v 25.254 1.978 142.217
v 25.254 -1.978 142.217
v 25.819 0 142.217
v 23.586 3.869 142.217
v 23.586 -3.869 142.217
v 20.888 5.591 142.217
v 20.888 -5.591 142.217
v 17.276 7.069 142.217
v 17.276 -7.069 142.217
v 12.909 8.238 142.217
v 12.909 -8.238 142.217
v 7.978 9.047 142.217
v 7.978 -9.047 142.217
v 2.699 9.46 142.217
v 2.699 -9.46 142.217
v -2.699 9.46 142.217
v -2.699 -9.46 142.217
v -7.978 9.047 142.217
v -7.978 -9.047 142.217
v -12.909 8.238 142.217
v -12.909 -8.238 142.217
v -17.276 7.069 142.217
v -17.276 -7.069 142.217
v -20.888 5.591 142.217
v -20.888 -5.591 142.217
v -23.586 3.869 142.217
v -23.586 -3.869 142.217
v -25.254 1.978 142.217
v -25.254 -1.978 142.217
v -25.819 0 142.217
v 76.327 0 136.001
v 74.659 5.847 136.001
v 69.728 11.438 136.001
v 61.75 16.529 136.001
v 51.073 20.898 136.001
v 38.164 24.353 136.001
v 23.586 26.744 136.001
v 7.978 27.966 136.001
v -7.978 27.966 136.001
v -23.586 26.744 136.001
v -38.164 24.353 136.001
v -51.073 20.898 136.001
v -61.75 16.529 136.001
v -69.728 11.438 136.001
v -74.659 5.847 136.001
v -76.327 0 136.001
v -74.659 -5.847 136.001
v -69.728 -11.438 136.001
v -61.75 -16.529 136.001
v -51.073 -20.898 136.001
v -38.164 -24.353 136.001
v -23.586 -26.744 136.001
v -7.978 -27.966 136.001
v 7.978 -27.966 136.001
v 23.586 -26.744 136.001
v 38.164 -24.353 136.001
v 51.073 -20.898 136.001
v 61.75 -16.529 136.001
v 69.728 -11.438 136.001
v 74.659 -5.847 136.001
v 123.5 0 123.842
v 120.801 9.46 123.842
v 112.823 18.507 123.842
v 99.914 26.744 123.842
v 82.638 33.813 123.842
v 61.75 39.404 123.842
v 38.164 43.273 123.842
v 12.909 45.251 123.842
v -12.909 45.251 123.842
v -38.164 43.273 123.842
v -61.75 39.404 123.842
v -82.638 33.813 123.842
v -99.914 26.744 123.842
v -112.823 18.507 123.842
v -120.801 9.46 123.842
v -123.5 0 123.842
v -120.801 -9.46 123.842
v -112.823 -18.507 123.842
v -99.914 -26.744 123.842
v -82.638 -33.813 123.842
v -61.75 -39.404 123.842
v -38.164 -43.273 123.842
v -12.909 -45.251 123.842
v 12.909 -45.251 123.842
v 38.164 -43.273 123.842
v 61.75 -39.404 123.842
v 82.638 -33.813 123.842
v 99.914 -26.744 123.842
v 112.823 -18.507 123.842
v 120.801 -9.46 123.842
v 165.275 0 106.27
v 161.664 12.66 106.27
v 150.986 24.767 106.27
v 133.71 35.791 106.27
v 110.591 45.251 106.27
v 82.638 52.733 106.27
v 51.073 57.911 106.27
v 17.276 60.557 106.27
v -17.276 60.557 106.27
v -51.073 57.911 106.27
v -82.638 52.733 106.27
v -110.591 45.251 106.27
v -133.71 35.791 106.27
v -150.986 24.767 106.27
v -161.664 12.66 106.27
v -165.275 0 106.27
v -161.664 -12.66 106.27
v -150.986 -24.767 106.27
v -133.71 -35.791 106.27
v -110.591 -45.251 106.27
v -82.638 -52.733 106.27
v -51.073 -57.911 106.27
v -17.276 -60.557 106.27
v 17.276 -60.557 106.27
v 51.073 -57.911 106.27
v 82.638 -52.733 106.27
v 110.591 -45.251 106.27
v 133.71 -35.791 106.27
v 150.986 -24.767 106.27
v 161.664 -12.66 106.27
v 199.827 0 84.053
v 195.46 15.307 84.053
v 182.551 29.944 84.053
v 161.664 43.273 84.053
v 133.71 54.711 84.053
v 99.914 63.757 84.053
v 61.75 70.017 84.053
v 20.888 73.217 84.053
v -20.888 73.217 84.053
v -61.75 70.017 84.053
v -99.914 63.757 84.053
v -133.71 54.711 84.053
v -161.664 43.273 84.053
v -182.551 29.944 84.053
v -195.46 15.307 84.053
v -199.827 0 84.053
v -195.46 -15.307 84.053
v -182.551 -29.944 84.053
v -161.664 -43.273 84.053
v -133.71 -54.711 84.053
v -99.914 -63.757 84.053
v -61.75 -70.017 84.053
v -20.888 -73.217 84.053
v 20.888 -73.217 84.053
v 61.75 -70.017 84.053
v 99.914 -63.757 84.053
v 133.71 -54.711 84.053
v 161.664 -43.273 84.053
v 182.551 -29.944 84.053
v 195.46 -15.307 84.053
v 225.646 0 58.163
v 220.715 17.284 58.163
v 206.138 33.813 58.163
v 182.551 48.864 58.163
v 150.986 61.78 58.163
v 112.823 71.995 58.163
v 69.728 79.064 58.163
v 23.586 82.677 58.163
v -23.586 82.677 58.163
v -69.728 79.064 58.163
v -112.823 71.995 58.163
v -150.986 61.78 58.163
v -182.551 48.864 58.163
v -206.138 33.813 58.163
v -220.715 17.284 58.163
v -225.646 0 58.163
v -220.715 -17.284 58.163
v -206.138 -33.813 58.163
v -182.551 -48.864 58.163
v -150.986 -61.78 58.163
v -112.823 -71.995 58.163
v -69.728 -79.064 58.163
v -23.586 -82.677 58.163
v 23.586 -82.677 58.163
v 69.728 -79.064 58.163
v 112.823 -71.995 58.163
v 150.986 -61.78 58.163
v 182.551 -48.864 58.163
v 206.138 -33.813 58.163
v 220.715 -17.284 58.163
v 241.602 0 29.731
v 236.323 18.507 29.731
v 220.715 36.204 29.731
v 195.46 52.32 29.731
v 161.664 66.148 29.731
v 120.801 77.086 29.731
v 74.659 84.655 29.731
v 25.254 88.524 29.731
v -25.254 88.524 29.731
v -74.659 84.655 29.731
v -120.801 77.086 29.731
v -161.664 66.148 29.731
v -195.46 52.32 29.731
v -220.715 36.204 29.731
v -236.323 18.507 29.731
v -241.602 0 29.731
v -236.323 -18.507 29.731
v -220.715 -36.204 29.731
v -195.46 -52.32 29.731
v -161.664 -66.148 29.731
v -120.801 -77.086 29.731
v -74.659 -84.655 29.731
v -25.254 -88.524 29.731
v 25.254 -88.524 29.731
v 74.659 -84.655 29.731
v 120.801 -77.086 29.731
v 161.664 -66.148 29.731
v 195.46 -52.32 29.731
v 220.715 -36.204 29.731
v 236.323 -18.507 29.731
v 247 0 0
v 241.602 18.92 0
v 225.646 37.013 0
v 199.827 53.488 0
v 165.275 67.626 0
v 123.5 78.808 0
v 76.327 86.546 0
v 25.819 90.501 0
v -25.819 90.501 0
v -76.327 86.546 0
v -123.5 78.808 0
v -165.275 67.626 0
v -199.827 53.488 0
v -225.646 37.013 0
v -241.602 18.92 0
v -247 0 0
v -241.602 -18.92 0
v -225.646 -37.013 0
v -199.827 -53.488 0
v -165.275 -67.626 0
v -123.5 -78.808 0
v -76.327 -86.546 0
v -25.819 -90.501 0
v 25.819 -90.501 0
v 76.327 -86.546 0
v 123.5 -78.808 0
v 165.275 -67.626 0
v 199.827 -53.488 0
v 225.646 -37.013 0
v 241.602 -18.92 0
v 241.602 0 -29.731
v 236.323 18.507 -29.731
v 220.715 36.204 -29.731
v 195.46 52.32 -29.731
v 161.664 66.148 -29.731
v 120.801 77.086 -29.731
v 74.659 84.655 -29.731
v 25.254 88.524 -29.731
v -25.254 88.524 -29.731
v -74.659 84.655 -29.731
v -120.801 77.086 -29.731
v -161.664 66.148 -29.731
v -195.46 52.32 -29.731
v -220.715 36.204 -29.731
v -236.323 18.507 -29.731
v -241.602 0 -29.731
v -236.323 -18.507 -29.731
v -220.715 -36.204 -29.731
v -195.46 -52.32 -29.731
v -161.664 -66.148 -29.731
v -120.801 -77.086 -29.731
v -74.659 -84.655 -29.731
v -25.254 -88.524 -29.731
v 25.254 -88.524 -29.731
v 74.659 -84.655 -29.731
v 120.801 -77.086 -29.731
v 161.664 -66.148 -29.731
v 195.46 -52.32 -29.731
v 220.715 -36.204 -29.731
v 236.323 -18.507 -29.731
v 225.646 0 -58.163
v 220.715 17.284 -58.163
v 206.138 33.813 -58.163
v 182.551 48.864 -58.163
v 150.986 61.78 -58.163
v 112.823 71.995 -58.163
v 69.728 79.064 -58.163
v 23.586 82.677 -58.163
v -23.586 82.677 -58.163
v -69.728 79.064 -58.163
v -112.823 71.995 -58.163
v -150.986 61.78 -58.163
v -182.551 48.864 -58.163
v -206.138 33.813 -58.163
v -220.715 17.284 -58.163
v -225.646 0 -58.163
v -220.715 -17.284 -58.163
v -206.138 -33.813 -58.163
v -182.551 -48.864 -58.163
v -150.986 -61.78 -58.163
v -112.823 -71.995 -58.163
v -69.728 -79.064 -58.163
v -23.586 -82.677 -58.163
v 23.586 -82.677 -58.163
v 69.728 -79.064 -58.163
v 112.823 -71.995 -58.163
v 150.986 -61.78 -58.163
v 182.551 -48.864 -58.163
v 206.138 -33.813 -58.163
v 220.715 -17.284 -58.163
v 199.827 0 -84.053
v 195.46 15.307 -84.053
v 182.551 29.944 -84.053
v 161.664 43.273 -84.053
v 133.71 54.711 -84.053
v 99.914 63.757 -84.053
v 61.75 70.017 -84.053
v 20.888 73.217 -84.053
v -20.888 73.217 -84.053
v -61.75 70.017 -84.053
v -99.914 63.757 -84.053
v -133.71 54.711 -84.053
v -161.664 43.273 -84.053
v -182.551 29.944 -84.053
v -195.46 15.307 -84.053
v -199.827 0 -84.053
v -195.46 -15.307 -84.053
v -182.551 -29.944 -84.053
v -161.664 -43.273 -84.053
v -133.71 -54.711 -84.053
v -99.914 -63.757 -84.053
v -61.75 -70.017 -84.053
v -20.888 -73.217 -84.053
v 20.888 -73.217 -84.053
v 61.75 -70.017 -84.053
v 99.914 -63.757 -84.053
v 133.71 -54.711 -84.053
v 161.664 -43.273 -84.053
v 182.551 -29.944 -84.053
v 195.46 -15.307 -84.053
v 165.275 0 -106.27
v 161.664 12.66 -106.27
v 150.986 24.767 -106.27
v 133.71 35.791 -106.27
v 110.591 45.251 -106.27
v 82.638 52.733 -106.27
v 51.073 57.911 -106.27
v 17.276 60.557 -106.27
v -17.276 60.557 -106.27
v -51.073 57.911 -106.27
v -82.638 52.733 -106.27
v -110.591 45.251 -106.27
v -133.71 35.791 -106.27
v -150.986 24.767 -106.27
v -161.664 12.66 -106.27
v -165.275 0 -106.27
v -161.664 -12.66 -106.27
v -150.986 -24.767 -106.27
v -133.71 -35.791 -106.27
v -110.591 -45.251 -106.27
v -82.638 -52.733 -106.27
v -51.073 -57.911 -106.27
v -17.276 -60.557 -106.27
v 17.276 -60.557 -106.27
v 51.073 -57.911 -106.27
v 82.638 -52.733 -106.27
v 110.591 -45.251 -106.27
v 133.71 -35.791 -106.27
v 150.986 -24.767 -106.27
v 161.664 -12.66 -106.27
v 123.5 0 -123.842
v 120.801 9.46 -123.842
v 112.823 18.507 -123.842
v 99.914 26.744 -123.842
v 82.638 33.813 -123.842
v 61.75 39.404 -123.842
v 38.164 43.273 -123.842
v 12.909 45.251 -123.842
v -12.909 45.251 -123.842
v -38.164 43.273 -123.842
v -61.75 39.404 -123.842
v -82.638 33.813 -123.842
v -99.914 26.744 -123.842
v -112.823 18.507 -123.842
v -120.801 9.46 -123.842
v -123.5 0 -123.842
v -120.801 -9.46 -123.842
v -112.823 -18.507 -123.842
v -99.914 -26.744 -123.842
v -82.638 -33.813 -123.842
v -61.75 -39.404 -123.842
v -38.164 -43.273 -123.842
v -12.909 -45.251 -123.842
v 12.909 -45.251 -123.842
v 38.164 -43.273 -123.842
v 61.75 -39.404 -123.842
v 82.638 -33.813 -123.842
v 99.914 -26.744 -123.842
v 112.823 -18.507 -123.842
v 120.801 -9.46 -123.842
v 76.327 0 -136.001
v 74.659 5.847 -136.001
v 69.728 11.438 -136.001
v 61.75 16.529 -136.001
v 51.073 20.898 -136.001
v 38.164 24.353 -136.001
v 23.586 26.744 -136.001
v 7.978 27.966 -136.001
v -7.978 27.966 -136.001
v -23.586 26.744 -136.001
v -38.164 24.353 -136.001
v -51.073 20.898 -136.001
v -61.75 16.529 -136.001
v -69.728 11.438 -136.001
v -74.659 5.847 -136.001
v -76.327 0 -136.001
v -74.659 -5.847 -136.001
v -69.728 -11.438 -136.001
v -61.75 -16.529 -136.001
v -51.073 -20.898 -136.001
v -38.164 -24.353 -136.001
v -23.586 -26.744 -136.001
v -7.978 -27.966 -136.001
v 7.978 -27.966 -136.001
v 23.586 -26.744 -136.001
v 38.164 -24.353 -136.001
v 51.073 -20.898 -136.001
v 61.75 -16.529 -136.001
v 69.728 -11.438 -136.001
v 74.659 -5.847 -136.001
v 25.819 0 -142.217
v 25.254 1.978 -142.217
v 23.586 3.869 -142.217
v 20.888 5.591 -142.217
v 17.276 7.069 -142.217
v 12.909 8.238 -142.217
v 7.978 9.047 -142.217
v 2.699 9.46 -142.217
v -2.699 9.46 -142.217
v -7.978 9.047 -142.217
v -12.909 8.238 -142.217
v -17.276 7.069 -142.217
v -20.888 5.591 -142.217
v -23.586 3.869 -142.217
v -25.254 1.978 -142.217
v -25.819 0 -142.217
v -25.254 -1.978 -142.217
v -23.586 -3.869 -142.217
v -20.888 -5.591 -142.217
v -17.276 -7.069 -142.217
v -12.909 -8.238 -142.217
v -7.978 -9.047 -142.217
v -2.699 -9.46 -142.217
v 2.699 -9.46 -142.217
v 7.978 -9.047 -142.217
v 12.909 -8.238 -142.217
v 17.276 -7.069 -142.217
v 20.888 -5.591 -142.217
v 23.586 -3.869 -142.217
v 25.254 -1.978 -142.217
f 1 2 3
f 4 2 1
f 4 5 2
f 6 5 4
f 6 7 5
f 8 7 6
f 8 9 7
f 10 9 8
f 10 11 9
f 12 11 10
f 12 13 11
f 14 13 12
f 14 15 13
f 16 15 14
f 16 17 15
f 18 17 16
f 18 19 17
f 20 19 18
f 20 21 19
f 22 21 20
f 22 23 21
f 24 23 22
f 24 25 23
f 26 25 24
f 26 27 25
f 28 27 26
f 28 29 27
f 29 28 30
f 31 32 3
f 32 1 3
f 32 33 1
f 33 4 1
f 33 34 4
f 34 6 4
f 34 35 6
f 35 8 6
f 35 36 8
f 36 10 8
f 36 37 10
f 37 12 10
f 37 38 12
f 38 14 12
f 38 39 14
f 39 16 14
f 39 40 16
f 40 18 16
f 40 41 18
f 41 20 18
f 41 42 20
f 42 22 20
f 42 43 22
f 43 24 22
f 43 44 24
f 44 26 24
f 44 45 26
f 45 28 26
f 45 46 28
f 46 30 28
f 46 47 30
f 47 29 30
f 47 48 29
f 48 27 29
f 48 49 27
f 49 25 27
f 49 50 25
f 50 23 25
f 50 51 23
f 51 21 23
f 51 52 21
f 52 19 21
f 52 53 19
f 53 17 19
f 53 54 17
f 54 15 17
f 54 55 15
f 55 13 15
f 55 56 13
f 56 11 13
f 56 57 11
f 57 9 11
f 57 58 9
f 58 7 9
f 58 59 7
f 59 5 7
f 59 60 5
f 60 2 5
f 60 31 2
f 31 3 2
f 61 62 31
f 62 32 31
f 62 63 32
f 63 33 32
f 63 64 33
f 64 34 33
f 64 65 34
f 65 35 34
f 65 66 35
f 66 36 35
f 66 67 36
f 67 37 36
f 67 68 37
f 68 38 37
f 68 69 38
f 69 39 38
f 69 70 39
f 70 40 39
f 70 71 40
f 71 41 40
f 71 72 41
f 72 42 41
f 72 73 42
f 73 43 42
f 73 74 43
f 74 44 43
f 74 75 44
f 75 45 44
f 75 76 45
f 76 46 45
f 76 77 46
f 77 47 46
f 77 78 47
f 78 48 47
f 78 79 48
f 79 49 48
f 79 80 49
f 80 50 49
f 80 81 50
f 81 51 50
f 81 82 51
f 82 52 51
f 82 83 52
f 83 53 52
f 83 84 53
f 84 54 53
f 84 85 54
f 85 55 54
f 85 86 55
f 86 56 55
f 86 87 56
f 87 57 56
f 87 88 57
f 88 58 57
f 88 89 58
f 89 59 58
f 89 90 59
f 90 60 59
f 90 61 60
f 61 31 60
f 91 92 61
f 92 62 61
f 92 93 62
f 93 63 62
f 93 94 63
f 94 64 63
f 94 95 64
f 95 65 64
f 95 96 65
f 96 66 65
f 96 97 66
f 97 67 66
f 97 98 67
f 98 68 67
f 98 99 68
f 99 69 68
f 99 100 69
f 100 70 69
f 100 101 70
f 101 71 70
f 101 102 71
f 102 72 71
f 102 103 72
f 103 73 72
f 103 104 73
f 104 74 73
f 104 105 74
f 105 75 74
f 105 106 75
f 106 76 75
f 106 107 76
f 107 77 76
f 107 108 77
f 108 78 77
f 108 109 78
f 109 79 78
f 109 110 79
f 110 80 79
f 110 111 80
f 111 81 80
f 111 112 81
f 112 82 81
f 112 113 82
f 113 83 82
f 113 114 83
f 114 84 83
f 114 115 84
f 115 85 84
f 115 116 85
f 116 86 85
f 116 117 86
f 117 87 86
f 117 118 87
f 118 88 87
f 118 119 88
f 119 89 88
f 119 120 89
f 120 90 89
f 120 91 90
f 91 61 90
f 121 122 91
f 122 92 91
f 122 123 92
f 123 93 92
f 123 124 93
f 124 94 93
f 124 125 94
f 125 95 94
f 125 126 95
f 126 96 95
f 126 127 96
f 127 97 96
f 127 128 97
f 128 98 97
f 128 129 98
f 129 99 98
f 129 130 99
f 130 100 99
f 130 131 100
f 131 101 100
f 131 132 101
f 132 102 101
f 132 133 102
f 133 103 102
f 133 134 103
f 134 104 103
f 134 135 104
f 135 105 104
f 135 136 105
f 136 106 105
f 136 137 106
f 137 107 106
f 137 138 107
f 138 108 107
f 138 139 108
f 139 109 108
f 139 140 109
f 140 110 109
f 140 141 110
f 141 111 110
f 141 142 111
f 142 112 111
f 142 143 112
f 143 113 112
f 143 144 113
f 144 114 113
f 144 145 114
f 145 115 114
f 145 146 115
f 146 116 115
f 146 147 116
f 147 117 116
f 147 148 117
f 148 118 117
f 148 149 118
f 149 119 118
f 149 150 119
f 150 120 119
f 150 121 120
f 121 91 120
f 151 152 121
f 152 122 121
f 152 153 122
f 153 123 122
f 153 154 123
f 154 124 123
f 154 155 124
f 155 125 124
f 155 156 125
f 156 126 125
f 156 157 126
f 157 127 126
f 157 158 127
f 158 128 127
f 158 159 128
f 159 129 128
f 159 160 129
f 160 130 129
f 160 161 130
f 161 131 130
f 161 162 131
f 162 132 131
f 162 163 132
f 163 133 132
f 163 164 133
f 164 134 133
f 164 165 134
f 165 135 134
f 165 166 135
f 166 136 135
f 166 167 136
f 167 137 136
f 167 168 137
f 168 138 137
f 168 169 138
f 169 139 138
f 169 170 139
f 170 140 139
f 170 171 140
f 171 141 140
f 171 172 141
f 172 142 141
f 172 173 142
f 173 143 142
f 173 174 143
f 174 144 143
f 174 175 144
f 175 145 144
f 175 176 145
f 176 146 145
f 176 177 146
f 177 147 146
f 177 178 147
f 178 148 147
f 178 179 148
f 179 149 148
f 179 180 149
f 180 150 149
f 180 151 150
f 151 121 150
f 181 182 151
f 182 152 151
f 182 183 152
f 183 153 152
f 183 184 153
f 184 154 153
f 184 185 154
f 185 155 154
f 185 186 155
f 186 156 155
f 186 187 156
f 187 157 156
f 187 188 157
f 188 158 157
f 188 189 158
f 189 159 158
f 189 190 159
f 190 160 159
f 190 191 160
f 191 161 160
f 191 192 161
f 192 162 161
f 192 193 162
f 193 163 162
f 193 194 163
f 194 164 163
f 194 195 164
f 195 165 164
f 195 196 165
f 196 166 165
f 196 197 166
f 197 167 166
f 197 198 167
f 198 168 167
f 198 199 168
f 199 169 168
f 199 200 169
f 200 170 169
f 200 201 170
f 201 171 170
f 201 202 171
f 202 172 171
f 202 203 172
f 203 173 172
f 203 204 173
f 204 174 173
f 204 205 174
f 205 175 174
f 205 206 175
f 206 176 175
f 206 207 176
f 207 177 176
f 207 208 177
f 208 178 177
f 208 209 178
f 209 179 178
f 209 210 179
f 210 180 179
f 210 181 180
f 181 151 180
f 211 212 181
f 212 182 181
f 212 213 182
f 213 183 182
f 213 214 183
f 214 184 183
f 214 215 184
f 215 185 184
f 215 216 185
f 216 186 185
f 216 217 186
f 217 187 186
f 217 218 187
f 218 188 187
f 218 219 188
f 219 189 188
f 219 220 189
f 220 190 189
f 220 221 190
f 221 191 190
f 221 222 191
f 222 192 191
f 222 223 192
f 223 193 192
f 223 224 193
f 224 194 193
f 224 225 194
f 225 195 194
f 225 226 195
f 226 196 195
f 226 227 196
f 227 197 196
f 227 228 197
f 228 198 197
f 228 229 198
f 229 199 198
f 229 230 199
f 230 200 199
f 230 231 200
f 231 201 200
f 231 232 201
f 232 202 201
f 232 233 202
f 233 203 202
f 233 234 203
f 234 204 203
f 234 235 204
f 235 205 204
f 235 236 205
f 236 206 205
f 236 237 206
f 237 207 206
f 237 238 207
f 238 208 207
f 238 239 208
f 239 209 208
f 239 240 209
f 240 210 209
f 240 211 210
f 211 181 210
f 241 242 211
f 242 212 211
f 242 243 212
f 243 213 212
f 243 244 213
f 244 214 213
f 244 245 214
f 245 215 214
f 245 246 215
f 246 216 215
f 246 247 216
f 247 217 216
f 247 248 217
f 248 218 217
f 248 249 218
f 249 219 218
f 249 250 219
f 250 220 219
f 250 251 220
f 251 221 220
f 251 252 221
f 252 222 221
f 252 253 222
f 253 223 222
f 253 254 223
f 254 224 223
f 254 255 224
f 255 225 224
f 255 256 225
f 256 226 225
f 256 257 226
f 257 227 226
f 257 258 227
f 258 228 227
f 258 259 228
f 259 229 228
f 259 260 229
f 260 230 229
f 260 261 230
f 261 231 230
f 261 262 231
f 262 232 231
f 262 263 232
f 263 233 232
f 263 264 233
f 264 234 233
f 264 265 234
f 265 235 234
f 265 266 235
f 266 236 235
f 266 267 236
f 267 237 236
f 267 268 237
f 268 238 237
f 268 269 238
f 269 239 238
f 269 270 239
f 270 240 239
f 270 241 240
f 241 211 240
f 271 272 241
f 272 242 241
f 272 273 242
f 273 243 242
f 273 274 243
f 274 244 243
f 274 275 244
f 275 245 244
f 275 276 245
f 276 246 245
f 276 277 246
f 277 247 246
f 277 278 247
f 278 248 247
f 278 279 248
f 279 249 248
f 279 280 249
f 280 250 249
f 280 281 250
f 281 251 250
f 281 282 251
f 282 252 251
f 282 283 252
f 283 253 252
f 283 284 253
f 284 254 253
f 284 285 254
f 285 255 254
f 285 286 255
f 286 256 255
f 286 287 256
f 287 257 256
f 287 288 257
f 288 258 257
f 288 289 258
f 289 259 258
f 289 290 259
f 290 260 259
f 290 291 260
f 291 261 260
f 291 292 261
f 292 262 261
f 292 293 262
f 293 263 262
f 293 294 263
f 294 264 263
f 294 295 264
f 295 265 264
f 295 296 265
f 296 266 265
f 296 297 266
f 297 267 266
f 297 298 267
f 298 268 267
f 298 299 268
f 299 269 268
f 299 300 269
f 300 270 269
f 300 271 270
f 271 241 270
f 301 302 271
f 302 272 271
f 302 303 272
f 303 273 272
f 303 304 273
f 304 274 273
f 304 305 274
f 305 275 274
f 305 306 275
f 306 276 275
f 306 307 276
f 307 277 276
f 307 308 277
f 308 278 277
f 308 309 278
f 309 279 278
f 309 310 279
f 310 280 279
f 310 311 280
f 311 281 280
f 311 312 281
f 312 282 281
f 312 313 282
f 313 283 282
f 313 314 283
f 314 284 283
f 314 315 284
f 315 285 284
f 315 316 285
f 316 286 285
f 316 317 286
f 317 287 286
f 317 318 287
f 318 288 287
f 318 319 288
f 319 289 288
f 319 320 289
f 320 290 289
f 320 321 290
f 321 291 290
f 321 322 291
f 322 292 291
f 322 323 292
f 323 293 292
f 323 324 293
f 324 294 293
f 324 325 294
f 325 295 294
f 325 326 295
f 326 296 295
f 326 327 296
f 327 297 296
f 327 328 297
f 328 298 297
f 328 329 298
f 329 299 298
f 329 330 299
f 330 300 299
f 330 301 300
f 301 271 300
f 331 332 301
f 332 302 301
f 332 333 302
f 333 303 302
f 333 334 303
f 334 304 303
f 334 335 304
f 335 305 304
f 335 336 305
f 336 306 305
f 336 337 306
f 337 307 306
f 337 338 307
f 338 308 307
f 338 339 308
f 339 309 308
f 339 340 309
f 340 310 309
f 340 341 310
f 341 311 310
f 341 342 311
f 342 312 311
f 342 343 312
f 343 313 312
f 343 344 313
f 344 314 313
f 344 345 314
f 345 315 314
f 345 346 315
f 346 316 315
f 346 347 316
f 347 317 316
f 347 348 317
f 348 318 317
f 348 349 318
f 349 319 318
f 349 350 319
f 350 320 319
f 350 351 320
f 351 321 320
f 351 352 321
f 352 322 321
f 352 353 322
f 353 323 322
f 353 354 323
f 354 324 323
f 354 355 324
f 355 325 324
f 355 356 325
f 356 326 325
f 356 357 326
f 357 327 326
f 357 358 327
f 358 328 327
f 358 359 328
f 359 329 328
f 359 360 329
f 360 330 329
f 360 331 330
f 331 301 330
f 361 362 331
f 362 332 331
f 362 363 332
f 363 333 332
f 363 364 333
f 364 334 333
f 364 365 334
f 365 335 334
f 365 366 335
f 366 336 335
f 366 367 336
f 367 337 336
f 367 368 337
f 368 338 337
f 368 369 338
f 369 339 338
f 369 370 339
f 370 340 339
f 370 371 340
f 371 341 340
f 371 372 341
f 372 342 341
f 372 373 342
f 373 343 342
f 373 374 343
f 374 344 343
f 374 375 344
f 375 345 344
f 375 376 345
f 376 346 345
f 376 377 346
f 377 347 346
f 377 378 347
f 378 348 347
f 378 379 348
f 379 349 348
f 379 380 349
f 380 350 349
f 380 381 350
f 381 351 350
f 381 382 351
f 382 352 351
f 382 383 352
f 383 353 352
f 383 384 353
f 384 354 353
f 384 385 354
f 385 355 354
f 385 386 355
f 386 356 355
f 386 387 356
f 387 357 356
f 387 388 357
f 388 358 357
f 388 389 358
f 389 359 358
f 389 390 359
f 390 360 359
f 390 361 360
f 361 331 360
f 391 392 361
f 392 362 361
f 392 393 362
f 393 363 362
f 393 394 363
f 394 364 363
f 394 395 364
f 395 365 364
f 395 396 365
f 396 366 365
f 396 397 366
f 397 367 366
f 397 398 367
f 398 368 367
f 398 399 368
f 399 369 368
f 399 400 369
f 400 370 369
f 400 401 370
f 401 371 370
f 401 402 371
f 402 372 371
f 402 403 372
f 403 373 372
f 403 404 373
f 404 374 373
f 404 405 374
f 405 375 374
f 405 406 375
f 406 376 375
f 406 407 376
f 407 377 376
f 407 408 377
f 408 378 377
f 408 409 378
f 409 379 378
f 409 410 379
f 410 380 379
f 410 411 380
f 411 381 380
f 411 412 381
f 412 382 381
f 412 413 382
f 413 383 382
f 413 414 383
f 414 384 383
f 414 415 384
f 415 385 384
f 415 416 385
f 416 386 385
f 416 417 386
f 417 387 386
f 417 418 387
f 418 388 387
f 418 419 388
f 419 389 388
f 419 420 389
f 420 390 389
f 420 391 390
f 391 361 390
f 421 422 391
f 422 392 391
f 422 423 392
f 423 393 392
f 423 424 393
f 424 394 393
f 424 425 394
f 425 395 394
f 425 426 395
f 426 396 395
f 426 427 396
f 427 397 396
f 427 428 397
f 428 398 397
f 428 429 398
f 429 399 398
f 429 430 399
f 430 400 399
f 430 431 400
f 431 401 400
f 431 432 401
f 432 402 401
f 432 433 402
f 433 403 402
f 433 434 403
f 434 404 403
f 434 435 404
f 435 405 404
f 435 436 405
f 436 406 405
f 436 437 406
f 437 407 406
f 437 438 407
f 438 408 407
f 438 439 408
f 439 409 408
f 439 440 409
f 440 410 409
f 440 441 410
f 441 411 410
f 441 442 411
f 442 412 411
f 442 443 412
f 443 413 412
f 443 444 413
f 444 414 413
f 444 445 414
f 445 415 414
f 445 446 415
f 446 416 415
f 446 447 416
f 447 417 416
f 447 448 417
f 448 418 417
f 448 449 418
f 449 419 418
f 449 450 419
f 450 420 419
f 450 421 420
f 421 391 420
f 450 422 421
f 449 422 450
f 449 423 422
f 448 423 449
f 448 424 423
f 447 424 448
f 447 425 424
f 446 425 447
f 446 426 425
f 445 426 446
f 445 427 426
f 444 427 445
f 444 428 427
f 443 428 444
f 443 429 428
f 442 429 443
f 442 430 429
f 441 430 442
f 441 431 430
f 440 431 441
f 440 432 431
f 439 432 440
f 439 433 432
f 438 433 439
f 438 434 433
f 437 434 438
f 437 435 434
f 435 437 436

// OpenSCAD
// Generated by SolidPython 1.0.1 on 2020-07-29 00:46:53


scale(v = [19, 7, 11]) {
	sphere(r = 13);
}
/***********************************************
*********      SolidPython code:      **********
************************************************
 
# import packages: SolidPython
from solid import *
from solid.utils import *
from itertools import chain, combinations, permutations


class Resize:

    def __init__(self, scad_file):
        self.scad_file = scad_file
        #self.scad_file = import_scad(scad_file)
        # cone/cylinder param:
        self.r1 = 0
        self.r2 = 0
        self.h = 0
        # rectangular prism param:
        self.w = 0
        self.l = 0
        # ellipse param:
        self.r = 0

    # import OpenScad code (file name corresponds to shape)


    # classify shape + parameters
    def assign(self, param1, param2, param3):
        if self.scad_file == 'cone.scad':
            self.r1 = param1
            self.r2 = param2
            self.h = param3
        elif self.scad_file == 'cylinder.scad':
            self.r1 = param1
            self.r2 = param2
            self.h = param3
        elif self.scad_file == 'rectangularPrism.scad':
            self.h = param1
            self.l = param2
            self.w = param3
        else:
            self.r = param1
            self.h = param2

    # resize parameters
    def iterate(self):
        x = range(3, 20, 2)
        i = 1
        if self.scad_file == 'cone.scad':
            tempList = list(permutations(x, 2))
            for temp in tempList:
                param1 = temp[0]
                param2 = temp[1]
                filepath = 'produced_scad_files/' + 'cone' + str(param1) + '_' + str(param2) + '_' + '.scad'
                scad_render_to_file(cylinder(h=param1, r1=param2, r2=0), filepath)

        elif self.scad_file == 'cylinder.scad':
            tempList = list(permutations(x, 3))
            for temp in tempList:
                param1 = temp[0]
                param2 = temp[1]
                filepath = 'produced_scad_files/' + 'cylinder' + str(param1) + '_' + str(param2) + '_' + '.scad'
                scad_render_to_file(cylinder(h=param1, r1=param2, r2=param2), filepath)

        elif self.scad_file == 'rectangularPrism.scad':
            tempList = list(permutations(x, 3))
            for temp in tempList:
                param1 = temp[0]
                param2 = temp[1]
                param3 = temp[2]
                filepath = 'produced_scad_files/' + 'rectangularPrism' + str(param1) + '_' + str(param2) + '_' + str(
                    param3) + '.scad'
                scad_render_to_file(cube(size=(param1, param2, param3)), filepath)

        elif self.scad_file == 'ellipse.scad':
            tempList = list(permutations(x, 4))
            for temp in tempList:
                param1 = temp[0]
                param2 = temp[1]
                param3 = temp[2]
                param4 = temp[3]
                filepath = 'produced_scad_files/' + 'ellipse' + str(param1) + '_' + str(param2) + '_' + str(param3) + '_' + str(param4) + '.scad'
                scad_render_to_file(scale([param1, param2, param3])(sphere(r=param4)), filepath)

    def render_to_scadfile(self):
        scad_render_to_file(scad, 'example.scad') 
 
************************************************/
